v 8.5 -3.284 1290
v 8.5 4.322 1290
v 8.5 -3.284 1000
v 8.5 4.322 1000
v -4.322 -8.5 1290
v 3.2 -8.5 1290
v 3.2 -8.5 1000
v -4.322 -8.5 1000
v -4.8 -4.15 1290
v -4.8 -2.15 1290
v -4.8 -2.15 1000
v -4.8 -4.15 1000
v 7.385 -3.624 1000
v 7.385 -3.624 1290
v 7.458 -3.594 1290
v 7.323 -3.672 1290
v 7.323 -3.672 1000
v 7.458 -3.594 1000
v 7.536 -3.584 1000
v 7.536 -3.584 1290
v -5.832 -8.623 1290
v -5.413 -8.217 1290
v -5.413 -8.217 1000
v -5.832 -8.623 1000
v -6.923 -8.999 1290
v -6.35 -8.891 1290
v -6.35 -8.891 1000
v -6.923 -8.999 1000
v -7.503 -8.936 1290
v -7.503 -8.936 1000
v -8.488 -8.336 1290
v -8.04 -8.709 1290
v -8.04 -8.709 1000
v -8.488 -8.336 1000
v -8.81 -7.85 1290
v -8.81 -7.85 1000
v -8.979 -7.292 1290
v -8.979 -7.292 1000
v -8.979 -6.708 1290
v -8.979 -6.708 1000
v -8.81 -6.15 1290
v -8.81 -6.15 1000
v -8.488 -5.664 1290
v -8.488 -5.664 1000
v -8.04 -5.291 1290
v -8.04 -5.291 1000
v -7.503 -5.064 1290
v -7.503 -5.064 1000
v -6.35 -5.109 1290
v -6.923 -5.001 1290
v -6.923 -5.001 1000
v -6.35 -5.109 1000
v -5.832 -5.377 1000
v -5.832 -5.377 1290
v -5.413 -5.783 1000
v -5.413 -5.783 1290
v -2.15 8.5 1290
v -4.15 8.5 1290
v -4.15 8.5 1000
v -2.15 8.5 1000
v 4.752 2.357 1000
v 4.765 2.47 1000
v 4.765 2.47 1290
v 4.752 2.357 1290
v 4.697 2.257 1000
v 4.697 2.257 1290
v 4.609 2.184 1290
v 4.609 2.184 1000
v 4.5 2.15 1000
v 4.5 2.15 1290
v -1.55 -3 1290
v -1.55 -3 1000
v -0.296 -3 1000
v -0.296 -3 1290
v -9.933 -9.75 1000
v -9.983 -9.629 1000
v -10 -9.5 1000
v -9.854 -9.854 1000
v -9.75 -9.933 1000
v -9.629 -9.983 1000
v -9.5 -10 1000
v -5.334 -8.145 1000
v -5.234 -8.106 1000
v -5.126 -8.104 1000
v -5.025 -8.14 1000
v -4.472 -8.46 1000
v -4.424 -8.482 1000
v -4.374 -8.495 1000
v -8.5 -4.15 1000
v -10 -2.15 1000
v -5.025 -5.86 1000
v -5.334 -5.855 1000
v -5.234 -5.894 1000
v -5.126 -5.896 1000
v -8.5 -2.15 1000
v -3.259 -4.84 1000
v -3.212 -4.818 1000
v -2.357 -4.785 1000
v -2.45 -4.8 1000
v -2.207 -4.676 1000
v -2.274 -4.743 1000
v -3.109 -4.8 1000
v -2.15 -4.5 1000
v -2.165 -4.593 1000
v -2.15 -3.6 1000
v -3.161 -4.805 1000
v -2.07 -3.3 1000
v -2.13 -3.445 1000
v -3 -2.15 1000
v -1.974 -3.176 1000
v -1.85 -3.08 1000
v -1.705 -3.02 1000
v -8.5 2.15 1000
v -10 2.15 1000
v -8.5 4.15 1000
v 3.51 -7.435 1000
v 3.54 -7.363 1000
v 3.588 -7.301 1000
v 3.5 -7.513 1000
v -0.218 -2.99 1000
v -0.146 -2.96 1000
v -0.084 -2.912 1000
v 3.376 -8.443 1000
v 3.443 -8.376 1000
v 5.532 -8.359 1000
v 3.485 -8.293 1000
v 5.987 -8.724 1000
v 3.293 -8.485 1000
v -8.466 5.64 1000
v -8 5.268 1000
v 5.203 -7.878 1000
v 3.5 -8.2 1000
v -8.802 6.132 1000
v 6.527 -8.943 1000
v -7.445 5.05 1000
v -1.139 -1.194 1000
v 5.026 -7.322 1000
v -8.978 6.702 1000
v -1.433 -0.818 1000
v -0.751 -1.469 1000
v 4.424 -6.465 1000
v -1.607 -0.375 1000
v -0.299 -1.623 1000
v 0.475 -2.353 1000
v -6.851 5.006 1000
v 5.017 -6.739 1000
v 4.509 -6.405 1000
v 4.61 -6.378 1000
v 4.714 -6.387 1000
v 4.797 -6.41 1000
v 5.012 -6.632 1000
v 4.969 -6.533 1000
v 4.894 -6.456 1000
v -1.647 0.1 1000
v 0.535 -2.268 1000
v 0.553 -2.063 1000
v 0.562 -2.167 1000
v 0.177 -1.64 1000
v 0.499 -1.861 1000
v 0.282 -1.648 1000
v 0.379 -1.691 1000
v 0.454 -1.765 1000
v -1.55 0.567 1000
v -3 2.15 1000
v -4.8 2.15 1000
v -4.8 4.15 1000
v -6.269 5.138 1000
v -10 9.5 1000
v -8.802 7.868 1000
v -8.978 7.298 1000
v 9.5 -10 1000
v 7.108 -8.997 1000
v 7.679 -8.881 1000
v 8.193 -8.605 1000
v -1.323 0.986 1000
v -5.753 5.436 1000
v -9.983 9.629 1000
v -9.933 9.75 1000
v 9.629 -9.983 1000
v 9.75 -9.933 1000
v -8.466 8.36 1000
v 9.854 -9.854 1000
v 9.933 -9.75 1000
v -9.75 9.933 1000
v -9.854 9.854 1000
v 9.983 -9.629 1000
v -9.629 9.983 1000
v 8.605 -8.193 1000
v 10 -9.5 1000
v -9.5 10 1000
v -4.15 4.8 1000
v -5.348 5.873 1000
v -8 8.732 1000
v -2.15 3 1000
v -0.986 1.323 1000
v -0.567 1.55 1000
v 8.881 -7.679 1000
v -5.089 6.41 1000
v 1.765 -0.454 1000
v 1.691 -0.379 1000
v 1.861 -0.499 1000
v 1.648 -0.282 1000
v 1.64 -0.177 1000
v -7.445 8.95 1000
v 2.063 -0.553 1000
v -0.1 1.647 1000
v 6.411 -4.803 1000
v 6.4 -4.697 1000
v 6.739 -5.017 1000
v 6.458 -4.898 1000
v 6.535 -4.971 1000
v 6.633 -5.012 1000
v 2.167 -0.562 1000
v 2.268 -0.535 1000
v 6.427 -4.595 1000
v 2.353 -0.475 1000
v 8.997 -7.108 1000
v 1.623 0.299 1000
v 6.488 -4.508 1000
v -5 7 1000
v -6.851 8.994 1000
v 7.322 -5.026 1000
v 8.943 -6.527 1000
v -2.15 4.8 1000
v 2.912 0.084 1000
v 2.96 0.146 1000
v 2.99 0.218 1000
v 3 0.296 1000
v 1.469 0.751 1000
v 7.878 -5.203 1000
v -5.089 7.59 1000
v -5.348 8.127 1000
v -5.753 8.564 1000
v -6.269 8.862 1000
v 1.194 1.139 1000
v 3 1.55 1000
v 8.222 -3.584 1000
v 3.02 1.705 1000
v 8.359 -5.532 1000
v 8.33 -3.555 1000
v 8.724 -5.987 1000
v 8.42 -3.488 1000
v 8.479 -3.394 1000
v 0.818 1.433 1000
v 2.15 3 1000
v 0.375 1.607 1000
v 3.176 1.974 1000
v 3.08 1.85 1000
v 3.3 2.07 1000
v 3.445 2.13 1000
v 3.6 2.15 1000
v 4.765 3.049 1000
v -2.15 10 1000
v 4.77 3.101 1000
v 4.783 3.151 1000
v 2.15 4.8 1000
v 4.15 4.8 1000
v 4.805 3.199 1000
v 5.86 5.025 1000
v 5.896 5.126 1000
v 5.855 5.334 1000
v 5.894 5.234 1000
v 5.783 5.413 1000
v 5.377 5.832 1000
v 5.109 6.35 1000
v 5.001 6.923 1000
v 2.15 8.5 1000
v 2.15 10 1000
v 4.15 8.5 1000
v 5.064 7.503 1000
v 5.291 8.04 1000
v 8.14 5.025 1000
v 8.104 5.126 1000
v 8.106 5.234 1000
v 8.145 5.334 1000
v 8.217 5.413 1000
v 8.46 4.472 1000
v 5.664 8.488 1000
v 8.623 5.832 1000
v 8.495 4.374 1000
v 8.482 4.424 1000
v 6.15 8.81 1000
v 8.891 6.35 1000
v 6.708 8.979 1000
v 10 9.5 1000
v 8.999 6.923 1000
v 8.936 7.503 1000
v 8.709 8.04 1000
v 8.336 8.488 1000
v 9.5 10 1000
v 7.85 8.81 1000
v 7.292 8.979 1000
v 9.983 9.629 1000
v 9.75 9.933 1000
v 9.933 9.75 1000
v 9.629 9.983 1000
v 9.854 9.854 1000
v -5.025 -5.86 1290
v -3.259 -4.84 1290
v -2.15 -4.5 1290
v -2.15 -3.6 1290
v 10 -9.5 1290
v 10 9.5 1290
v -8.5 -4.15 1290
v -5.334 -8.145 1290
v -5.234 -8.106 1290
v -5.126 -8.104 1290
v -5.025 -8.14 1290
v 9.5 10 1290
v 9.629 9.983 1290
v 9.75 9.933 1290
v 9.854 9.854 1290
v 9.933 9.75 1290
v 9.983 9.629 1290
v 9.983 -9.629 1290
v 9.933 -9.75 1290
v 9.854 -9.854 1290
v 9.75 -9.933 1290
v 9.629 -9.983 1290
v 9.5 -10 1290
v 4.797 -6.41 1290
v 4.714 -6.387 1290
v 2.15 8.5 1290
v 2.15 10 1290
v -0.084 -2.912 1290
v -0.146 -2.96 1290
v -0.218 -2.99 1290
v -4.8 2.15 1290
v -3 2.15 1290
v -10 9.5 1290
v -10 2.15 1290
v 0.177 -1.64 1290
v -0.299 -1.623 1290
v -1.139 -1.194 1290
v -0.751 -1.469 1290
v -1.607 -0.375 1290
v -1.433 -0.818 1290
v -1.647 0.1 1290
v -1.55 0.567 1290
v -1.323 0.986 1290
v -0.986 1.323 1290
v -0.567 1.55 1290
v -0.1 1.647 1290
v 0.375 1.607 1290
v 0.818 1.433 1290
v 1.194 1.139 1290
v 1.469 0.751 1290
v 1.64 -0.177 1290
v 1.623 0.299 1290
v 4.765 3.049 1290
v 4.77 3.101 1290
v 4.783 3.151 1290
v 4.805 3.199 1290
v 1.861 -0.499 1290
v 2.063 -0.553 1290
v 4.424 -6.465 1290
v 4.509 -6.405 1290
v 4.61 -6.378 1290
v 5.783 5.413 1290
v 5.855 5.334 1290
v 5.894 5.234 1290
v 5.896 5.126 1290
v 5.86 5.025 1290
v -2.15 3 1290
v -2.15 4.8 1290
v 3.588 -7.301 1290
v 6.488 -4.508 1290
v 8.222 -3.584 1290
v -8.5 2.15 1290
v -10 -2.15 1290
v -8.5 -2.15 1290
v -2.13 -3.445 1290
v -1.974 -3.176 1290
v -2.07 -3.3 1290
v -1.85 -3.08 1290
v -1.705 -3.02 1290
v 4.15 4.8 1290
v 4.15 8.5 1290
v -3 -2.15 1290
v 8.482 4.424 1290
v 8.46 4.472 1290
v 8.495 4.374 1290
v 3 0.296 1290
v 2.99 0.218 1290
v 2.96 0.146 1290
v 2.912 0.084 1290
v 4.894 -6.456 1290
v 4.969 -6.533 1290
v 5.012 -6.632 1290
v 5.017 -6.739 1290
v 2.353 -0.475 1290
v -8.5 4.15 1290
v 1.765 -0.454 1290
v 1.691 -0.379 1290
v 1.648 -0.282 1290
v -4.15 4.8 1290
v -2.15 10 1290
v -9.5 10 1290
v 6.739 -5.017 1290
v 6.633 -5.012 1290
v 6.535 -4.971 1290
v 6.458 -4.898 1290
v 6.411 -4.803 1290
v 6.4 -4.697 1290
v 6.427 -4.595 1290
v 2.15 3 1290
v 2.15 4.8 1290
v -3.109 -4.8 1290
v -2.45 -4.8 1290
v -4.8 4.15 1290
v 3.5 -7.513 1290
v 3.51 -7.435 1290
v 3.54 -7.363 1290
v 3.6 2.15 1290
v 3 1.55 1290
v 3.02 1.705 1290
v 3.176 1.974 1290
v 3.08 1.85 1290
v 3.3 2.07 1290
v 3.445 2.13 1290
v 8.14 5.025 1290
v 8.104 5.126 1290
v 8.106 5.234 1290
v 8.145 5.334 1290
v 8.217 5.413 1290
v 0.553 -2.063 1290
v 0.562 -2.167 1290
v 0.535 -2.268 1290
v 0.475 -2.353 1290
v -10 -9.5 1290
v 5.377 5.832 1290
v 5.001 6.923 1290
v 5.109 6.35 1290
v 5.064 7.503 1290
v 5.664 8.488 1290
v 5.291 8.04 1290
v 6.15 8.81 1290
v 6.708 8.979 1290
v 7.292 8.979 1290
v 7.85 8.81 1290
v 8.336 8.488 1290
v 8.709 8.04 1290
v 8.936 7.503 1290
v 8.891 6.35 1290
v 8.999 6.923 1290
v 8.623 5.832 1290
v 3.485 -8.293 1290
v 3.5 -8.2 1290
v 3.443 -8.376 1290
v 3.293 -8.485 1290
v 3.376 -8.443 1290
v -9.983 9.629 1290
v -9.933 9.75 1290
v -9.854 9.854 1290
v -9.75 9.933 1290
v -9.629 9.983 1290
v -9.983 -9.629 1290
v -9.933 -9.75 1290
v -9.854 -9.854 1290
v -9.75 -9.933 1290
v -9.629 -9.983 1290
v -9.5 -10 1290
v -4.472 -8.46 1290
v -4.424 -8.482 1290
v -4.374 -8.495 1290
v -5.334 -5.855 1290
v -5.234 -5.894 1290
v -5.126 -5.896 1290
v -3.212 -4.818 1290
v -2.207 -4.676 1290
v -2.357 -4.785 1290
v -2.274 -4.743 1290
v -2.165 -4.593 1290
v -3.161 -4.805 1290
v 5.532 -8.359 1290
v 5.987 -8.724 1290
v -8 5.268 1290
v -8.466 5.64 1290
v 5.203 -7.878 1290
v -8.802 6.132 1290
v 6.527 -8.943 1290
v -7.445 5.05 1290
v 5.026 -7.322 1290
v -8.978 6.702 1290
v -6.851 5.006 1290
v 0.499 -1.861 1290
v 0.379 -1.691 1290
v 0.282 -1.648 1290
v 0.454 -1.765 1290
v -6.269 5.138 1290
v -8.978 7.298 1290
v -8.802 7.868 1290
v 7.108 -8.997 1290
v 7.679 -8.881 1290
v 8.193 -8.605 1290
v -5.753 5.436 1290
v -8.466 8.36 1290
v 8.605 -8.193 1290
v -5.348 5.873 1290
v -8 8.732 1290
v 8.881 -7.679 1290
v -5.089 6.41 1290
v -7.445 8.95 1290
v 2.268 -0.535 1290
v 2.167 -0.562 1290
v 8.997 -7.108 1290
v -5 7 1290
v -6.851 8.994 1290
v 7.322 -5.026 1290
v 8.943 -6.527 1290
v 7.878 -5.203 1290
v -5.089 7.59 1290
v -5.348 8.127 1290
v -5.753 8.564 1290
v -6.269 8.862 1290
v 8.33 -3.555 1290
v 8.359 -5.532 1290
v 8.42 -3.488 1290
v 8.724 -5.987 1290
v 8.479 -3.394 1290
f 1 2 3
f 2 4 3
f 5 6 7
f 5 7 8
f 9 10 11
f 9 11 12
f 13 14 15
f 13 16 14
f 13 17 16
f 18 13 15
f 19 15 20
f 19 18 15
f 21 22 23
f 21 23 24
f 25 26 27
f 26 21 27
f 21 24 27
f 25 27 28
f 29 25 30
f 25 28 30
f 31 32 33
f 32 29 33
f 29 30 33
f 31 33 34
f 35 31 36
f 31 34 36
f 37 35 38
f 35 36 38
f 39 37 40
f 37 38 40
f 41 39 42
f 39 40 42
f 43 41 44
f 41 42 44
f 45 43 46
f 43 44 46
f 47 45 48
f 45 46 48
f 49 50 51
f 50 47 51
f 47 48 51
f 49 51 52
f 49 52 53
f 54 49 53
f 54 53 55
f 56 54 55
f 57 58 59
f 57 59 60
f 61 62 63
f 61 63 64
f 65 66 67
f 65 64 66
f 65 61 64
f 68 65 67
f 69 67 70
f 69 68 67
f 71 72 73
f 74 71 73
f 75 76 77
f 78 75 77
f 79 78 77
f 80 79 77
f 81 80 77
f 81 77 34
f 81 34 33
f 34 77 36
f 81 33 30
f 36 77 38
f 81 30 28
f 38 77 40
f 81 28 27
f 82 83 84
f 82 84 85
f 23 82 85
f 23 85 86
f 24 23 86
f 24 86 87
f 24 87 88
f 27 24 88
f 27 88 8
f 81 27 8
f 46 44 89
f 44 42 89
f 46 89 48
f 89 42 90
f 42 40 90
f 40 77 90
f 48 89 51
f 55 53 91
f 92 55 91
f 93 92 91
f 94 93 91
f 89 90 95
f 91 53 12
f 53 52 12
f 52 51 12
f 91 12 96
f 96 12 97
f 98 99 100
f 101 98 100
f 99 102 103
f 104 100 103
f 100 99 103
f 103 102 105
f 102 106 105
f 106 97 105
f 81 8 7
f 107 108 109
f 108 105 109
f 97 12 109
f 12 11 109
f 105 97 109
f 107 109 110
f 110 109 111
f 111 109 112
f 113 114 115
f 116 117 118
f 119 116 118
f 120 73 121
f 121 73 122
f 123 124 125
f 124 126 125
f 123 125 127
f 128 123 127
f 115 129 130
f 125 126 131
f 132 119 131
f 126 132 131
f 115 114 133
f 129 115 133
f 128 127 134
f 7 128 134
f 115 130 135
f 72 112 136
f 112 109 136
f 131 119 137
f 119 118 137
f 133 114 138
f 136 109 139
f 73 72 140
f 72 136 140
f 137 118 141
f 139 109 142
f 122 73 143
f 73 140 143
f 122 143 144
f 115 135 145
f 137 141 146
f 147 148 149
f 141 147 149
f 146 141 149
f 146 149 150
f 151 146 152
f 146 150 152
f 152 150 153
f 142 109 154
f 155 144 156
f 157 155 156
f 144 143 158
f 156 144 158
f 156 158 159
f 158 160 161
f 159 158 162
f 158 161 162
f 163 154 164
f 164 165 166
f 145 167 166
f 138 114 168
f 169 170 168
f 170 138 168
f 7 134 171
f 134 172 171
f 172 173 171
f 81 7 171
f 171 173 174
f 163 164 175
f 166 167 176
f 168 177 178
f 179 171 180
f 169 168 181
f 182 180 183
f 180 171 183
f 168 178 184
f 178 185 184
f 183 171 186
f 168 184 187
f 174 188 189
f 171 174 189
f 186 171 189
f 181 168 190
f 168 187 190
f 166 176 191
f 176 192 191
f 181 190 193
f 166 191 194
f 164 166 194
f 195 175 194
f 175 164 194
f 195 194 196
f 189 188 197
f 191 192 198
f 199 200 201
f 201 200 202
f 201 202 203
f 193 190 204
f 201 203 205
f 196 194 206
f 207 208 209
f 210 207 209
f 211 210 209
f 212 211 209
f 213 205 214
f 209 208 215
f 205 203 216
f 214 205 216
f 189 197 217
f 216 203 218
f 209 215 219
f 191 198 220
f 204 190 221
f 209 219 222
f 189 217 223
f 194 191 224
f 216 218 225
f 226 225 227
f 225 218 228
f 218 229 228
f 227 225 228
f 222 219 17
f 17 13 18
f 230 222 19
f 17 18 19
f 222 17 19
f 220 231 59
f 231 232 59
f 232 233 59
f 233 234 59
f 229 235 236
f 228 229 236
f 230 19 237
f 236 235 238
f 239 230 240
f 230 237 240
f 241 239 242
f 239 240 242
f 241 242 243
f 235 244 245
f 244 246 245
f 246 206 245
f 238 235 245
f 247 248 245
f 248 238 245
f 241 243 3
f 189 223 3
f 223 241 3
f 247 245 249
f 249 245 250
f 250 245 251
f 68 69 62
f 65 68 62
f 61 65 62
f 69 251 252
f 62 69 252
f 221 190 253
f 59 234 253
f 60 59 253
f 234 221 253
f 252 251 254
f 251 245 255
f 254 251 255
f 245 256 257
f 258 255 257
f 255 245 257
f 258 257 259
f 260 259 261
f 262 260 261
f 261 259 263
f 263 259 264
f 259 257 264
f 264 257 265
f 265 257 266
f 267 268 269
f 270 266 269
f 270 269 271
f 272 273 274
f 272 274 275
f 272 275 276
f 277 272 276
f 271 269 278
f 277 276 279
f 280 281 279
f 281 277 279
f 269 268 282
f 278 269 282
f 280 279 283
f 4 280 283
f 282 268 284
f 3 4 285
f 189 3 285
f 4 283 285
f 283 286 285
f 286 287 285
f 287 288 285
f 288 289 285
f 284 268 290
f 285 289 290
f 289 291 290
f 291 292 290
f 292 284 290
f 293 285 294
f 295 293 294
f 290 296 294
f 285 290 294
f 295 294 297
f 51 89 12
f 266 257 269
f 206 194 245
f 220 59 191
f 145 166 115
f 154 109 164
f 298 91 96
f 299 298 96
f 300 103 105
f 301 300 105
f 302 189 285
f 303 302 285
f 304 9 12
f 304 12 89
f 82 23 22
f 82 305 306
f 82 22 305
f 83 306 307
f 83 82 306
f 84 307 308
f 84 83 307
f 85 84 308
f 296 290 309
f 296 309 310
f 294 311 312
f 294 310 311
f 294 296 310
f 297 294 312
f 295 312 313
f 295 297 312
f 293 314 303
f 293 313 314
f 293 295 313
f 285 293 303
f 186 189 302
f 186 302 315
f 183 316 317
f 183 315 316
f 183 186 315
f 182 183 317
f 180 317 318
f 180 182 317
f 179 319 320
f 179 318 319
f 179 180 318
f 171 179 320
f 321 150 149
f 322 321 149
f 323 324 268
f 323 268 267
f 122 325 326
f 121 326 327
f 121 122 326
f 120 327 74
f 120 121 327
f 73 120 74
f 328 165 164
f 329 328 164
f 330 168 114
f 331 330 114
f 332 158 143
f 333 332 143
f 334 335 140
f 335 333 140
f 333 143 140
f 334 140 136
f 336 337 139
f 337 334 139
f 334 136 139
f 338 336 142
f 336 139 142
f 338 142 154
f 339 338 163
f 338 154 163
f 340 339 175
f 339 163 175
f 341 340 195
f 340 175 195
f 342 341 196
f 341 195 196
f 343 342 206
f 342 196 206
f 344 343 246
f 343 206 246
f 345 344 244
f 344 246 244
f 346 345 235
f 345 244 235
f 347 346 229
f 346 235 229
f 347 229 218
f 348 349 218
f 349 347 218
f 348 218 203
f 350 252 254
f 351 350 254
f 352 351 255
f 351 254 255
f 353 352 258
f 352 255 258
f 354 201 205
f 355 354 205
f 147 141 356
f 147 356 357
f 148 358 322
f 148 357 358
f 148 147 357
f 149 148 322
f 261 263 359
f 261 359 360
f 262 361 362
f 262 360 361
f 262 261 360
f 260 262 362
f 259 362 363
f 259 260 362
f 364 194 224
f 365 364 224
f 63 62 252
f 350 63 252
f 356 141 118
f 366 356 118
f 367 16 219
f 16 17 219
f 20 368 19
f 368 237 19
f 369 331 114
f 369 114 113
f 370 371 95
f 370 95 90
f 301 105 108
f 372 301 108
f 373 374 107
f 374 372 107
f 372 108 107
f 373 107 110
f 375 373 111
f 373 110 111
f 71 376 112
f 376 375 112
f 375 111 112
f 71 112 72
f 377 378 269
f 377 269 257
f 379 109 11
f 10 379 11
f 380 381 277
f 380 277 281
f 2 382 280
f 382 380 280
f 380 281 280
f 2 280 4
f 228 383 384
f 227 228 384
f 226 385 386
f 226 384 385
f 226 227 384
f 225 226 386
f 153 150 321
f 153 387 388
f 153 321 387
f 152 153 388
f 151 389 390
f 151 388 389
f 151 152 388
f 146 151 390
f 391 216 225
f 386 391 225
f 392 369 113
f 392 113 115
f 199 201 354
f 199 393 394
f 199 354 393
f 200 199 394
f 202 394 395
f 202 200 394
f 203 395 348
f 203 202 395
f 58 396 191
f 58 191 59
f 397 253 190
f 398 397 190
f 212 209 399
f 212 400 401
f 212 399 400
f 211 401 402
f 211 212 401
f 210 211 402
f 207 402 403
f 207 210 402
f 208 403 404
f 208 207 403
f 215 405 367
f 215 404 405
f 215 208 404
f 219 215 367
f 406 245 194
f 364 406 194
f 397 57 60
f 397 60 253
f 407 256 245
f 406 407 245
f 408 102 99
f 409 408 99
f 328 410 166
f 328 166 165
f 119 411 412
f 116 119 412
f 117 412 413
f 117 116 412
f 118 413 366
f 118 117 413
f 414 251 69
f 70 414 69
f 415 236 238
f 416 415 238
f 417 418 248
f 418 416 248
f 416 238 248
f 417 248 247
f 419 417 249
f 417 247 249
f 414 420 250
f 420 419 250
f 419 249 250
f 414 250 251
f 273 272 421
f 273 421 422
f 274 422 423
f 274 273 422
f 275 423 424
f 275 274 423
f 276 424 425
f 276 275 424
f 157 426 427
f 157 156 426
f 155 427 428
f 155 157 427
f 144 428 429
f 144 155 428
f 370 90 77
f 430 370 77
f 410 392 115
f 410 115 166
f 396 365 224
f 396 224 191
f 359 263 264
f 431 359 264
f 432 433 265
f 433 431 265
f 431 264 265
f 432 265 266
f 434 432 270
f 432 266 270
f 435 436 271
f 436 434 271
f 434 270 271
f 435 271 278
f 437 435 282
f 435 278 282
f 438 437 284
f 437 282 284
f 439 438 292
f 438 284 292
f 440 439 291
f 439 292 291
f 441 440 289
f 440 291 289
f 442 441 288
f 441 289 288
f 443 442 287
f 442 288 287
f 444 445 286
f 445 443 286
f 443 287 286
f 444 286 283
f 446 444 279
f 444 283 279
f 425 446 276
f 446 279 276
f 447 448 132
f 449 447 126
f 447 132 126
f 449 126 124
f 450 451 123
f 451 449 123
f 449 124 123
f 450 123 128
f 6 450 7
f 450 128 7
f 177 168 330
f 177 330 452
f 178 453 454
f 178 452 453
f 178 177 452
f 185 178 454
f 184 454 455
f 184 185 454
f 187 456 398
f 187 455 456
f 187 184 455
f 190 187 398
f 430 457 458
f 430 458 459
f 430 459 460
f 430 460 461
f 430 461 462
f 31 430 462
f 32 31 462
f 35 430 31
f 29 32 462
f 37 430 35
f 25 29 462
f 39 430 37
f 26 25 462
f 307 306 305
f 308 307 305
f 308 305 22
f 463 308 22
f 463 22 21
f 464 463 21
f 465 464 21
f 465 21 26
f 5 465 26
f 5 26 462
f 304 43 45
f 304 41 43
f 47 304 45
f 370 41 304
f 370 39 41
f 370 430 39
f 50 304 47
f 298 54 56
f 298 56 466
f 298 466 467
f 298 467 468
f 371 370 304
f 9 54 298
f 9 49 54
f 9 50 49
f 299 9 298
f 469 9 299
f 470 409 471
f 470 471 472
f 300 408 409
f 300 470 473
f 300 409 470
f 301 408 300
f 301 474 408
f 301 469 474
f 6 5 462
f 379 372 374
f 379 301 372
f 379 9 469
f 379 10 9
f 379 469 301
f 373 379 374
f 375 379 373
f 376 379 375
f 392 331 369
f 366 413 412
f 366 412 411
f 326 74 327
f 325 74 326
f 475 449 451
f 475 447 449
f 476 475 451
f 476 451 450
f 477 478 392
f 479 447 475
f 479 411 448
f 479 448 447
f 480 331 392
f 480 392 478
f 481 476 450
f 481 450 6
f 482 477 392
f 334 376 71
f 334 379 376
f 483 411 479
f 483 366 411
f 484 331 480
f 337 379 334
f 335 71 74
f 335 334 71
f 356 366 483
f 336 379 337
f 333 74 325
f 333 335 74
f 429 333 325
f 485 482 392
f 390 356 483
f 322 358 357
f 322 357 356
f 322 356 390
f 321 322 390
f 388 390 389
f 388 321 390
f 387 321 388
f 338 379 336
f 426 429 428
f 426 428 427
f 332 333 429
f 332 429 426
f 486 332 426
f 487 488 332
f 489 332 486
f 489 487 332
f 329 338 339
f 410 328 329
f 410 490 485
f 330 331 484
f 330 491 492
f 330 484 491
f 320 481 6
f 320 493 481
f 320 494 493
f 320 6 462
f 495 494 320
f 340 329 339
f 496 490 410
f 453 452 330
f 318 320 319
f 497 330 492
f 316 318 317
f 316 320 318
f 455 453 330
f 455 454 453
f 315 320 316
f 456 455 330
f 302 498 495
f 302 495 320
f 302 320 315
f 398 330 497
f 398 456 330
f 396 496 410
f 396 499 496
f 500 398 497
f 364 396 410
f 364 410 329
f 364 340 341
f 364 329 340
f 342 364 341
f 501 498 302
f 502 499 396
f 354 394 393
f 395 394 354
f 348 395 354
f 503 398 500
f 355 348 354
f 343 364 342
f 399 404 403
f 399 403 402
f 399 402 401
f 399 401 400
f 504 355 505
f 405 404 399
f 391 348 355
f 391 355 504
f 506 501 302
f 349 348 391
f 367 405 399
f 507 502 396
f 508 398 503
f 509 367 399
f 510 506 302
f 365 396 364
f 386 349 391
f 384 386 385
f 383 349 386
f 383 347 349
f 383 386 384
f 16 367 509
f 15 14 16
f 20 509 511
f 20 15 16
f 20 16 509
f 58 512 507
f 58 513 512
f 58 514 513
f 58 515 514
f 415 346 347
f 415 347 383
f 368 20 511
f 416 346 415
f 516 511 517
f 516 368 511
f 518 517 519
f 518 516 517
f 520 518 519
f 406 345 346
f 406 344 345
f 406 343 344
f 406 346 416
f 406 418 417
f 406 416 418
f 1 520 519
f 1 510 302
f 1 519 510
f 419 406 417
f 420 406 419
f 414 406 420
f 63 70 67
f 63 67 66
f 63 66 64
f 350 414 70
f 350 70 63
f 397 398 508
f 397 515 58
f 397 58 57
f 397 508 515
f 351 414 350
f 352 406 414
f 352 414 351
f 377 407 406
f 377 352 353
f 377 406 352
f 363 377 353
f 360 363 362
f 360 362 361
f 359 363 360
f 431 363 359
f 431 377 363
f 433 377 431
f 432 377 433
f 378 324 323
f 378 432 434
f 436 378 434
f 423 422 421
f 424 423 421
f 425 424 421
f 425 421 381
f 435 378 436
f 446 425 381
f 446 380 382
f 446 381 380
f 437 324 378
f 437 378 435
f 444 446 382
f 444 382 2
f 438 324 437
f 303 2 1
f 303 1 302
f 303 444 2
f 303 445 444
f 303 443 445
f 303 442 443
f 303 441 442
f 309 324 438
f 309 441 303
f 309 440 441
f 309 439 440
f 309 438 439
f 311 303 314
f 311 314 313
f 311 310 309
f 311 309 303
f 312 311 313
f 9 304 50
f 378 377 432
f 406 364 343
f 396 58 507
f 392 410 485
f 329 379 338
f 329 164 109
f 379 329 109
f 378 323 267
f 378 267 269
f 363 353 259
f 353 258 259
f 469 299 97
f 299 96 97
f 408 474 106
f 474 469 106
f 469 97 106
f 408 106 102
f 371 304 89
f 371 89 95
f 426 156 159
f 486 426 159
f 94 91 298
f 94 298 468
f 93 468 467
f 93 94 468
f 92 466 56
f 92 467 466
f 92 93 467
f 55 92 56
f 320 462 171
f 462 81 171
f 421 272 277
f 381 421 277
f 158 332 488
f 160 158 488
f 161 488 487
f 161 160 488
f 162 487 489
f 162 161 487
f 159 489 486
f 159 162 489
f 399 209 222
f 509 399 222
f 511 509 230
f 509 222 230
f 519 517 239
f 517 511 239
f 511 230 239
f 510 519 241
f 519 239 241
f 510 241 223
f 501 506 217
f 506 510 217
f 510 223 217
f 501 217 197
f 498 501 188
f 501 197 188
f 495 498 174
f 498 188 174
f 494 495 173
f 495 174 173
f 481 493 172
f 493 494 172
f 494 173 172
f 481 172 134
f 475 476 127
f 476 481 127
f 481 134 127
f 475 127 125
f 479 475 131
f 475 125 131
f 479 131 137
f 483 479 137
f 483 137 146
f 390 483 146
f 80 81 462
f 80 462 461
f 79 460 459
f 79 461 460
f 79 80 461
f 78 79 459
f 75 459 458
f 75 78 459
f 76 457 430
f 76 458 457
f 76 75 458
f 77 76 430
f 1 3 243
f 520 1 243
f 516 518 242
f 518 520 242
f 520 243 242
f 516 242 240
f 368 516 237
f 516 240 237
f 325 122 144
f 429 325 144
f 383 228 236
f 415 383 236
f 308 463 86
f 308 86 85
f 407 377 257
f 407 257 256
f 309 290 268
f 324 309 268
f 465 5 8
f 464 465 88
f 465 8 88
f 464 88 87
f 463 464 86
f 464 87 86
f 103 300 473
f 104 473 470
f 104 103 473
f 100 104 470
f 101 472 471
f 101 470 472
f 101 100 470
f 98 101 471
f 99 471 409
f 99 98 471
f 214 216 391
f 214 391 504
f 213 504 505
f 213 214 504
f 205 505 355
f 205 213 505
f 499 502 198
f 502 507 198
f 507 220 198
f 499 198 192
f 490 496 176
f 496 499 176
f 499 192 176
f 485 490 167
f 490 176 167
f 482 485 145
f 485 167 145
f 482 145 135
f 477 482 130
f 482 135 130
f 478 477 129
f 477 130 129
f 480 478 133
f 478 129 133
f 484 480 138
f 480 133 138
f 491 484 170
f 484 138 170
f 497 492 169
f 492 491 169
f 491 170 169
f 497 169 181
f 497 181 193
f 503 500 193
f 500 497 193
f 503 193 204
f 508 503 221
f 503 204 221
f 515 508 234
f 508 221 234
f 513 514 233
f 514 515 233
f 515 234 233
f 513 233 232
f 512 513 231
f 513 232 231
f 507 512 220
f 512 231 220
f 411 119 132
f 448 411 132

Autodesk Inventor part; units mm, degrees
ref_plane "YZ Plane" through (0, 0, 0) normal (1, 0, 0) x (0, 1, 0)
ref_plane "XZ Plane" through (0, 0, 0) normal (0, 1, 0) x (-1, 0, 0)
ref_plane "作業平面1" through (-9.5, -10, 1000) normal (0, 0, 1) x (1, 0, 0)
sketch "スケッチ1" plane through (-9.5, -10, 1000) normal (0, 0, 1) x (1, 0, 0)
  line L0 (7.35, 18.5) -> (7.35, 20) projected
  line L1 (7.35, 20) -> (0, 20) projected
  arc A0 (0, 20) -> (-0.5, 19.5) centre (0, 19.5) ccw projected
  line L2 (-0.5, 19.5) -> (-0.5, 12.15) projected
  line L3 (-0.5, 12.15) -> (1, 12.15) projected
  line L4 (1, 12.15) -> (1, 14.15) projected
  line L5 (1, 14.15) -> (4.7, 14.15) projected
  line L6 (4.7, 14.15) -> (4.7, 12.15) projected
  line L7 (4.7, 12.15) -> (6.5, 12.15) projected
  line L8 (6.5, 12.15) -> (6.5, 7.85) projected
  line L9 (6.5, 7.85) -> (4.7, 7.85) projected
  line L10 (4.7, 7.85) -> (4.7, 5.85) projected
  line L11 (4.7, 5.85) -> (1, 5.85) projected
  line L12 (1, 5.85) -> (1, 7.85) projected
  line L13 (1, 7.85) -> (-0.5, 7.85) projected
  line L14 (-0.5, 7.85) -> (-0.5, 0.5) projected
  arc A1 (-0.5, 0.5) -> (0, 0) centre (0, 0.5) ccw projected
  line L15 (0, 0) -> (19, 0) projected
  arc A2 (19, 0) -> (19.5, 0.5) centre (19, 0.5) ccw projected
  line L16 (19.5, 0.5) -> (19.5, 19.5) projected
  arc A3 (19.5, 19.5) -> (19, 20) centre (19, 19.5) ccw projected
  line L17 (19, 20) -> (11.65, 20) projected
  line L18 (11.65, 20) -> (11.65, 18.5) projected
  line L19 (11.65, 18.5) -> (13.65, 18.5) projected
  line L20 (13.65, 18.5) -> (13.65, 14.8) projected
  line L21 (13.65, 14.8) -> (11.65, 14.8) projected
  line L22 (11.65, 14.8) -> (11.65, 13) projected
  line L23 (11.65, 13) -> (7.35, 13) projected
  line L24 (7.35, 13) -> (7.35, 14.8) projected
  line L25 (7.35, 14.8) -> (5.35, 14.8) projected
  line L26 (5.35, 14.8) -> (5.35, 18.5) projected
  line L27 (5.35, 18.5) -> (7.35, 18.5) projected
  arc A4 (17.7174, 15.4132) -> (17.6402, 15.0252) centre (17.9, 15.1752) ccw projected
  line L28 (17.6402, 15.0252) -> (17.9598, 14.4715) projected
  arc A5 (18, 14.3215) -> (17.9598, 14.4715) centre (17.7, 14.3215) ccw projected
  line L29 (18, 14.3215) -> (18, 6.7162) projected
  arc A6 (17.7225, 6.4162) -> (18, 6.7162) centre (17.7, 6.7153) ccw projected
  line L30 (17.7225, 6.4162) -> (17.0355, 6.4162) projected
  arc A7 (17.0355, 6.4162) -> (16.8233, 6.3283) centre (17.0355, 6.1162) ccw projected
  line L31 (16.8233, 6.3283) -> (15.9875, 5.4924) projected
  arc A8 (15.9875, 5.4924) -> (16.2388, 4.9829) centre (16.1996, 5.2803) ccw projected
  arc A9 (14.5171, 3.2612) -> (16.2388, 4.9829) centre (16.5, 3) ccw projected
  arc A10 (14.5171, 3.2612) -> (14.2973, 3.5902) centre (14.2197, 3.3004) ccw projected
  line L32 (14.2973, 3.5902) -> (14.2135, 3.6127) projected
  arc A11 (14.2135, 3.6127) -> (13.9237, 3.535) centre (14.1359, 3.3229) ccw projected
  line L33 (13.9237, 3.535) -> (13.0879, 2.6991) projected
  arc A12 (13.0879, 2.6991) -> (13, 2.487) centre (13.3, 2.487) ccw projected
  line L34 (13, 2.487) -> (13, 1.8) projected
  arc A13 (12.7, 1.5) -> (13, 1.8) centre (12.7, 1.8) ccw projected
  line L35 (12.7, 1.5) -> (5.1785, 1.5) projected
  arc A14 (5.0285, 1.5402) -> (5.1785, 1.5) centre (5.1785, 1.8) ccw projected
  line L36 (5.0285, 1.5402) -> (4.4748, 1.8598) projected
  arc A15 (4.4748, 1.8598) -> (4.0868, 1.7826) centre (4.3248, 1.6) ccw projected
  arc A16 (4.0868, 4.2174) -> (4.0868, 1.7826) centre (2.5, 3) ccw projected
  arc A17 (4.0868, 4.2174) -> (4.4748, 4.1402) centre (4.3248, 4.4) ccw projected
  line L37 (4.4748, 4.1402) -> (6.2409, 5.1598) projected
  arc A18 (6.3909, 5.2) -> (6.2409, 5.1598) centre (6.3909, 4.9) ccw projected
  line L38 (6.3909, 5.2) -> (7.05, 5.2) projected
  arc A19 (7.05, 5.2) -> (7.35, 5.5) centre (7.05, 5.5) ccw projected
  line L39 (7.35, 5.5) -> (7.35, 6.4) projected
  arc A20 (7.95, 7) -> (7.35, 6.4) centre (7.95, 6.4) ccw projected
  line L40 (7.95, 7) -> (9.2042, 7) projected
  arc A21 (9.2042, 7) -> (9.4163, 7.0879) centre (9.2042, 7.3) ccw projected
  line L41 (9.4163, 7.0879) -> (9.9752, 7.6468) projected
  arc A22 (9.9752, 7.6468) -> (10.0529, 7.9366) centre (9.7631, 7.8589) ccw projected
  line L42 (10.0529, 7.9366) -> (9.9987, 8.1389) projected
  arc A23 (9.9987, 8.1389) -> (9.6768, 8.3595) centre (9.7089, 8.0612) ccw projected
  arc A24 (11.1405, 9.8232) -> (9.6768, 8.3595) centre (9.5, 10) ccw projected
  arc A25 (11.1405, 9.8232) -> (11.3611, 9.5013) centre (11.4388, 9.7911) ccw projected
  line L43 (11.3611, 9.5013) -> (11.5634, 9.4471) projected
  arc A26 (11.5634, 9.4471) -> (11.8532, 9.5248) centre (11.6411, 9.7369) ccw projected
  line L44 (11.8532, 9.5248) -> (12.4121, 10.0837) projected
  arc A27 (12.4121, 10.0837) -> (12.5, 10.2958) centre (12.2, 10.2958) ccw projected
  line L45 (12.5, 10.2958) -> (12.5, 11.55) projected
  arc A28 (13.1, 12.15) -> (12.5, 11.55) centre (13.1, 11.55) ccw projected
  line L46 (13.1, 12.15) -> (14, 12.15) projected
  arc A29 (14, 12.15) -> (14.2652, 12.4701) centre (13.966, 12.4481) ccw projected
  line L47 (14.2652, 12.4701) -> (14.2652, 13.0488) projected
  arc A30 (14.3054, 13.1988) -> (14.2652, 13.0488) centre (14.5652, 13.0488) ccw projected
  line L48 (14.3054, 13.1988) -> (15.3598, 15.0252) projected
  arc A31 (15.3598, 15.0252) -> (15.2826, 15.4132) centre (15.1, 15.1752) ccw projected
  arc A32 (17.7174, 15.4132) -> (15.2826, 15.4132) centre (16.5, 17) ccw projected
  circle A33 centre (2.5, 17) radius 2 projected
  point P0 (9.5, 10)
extrude "押し出し1" add sketch "スケッチ1" along normal blind 290
properties part number "AFST-2020-4-1000"
